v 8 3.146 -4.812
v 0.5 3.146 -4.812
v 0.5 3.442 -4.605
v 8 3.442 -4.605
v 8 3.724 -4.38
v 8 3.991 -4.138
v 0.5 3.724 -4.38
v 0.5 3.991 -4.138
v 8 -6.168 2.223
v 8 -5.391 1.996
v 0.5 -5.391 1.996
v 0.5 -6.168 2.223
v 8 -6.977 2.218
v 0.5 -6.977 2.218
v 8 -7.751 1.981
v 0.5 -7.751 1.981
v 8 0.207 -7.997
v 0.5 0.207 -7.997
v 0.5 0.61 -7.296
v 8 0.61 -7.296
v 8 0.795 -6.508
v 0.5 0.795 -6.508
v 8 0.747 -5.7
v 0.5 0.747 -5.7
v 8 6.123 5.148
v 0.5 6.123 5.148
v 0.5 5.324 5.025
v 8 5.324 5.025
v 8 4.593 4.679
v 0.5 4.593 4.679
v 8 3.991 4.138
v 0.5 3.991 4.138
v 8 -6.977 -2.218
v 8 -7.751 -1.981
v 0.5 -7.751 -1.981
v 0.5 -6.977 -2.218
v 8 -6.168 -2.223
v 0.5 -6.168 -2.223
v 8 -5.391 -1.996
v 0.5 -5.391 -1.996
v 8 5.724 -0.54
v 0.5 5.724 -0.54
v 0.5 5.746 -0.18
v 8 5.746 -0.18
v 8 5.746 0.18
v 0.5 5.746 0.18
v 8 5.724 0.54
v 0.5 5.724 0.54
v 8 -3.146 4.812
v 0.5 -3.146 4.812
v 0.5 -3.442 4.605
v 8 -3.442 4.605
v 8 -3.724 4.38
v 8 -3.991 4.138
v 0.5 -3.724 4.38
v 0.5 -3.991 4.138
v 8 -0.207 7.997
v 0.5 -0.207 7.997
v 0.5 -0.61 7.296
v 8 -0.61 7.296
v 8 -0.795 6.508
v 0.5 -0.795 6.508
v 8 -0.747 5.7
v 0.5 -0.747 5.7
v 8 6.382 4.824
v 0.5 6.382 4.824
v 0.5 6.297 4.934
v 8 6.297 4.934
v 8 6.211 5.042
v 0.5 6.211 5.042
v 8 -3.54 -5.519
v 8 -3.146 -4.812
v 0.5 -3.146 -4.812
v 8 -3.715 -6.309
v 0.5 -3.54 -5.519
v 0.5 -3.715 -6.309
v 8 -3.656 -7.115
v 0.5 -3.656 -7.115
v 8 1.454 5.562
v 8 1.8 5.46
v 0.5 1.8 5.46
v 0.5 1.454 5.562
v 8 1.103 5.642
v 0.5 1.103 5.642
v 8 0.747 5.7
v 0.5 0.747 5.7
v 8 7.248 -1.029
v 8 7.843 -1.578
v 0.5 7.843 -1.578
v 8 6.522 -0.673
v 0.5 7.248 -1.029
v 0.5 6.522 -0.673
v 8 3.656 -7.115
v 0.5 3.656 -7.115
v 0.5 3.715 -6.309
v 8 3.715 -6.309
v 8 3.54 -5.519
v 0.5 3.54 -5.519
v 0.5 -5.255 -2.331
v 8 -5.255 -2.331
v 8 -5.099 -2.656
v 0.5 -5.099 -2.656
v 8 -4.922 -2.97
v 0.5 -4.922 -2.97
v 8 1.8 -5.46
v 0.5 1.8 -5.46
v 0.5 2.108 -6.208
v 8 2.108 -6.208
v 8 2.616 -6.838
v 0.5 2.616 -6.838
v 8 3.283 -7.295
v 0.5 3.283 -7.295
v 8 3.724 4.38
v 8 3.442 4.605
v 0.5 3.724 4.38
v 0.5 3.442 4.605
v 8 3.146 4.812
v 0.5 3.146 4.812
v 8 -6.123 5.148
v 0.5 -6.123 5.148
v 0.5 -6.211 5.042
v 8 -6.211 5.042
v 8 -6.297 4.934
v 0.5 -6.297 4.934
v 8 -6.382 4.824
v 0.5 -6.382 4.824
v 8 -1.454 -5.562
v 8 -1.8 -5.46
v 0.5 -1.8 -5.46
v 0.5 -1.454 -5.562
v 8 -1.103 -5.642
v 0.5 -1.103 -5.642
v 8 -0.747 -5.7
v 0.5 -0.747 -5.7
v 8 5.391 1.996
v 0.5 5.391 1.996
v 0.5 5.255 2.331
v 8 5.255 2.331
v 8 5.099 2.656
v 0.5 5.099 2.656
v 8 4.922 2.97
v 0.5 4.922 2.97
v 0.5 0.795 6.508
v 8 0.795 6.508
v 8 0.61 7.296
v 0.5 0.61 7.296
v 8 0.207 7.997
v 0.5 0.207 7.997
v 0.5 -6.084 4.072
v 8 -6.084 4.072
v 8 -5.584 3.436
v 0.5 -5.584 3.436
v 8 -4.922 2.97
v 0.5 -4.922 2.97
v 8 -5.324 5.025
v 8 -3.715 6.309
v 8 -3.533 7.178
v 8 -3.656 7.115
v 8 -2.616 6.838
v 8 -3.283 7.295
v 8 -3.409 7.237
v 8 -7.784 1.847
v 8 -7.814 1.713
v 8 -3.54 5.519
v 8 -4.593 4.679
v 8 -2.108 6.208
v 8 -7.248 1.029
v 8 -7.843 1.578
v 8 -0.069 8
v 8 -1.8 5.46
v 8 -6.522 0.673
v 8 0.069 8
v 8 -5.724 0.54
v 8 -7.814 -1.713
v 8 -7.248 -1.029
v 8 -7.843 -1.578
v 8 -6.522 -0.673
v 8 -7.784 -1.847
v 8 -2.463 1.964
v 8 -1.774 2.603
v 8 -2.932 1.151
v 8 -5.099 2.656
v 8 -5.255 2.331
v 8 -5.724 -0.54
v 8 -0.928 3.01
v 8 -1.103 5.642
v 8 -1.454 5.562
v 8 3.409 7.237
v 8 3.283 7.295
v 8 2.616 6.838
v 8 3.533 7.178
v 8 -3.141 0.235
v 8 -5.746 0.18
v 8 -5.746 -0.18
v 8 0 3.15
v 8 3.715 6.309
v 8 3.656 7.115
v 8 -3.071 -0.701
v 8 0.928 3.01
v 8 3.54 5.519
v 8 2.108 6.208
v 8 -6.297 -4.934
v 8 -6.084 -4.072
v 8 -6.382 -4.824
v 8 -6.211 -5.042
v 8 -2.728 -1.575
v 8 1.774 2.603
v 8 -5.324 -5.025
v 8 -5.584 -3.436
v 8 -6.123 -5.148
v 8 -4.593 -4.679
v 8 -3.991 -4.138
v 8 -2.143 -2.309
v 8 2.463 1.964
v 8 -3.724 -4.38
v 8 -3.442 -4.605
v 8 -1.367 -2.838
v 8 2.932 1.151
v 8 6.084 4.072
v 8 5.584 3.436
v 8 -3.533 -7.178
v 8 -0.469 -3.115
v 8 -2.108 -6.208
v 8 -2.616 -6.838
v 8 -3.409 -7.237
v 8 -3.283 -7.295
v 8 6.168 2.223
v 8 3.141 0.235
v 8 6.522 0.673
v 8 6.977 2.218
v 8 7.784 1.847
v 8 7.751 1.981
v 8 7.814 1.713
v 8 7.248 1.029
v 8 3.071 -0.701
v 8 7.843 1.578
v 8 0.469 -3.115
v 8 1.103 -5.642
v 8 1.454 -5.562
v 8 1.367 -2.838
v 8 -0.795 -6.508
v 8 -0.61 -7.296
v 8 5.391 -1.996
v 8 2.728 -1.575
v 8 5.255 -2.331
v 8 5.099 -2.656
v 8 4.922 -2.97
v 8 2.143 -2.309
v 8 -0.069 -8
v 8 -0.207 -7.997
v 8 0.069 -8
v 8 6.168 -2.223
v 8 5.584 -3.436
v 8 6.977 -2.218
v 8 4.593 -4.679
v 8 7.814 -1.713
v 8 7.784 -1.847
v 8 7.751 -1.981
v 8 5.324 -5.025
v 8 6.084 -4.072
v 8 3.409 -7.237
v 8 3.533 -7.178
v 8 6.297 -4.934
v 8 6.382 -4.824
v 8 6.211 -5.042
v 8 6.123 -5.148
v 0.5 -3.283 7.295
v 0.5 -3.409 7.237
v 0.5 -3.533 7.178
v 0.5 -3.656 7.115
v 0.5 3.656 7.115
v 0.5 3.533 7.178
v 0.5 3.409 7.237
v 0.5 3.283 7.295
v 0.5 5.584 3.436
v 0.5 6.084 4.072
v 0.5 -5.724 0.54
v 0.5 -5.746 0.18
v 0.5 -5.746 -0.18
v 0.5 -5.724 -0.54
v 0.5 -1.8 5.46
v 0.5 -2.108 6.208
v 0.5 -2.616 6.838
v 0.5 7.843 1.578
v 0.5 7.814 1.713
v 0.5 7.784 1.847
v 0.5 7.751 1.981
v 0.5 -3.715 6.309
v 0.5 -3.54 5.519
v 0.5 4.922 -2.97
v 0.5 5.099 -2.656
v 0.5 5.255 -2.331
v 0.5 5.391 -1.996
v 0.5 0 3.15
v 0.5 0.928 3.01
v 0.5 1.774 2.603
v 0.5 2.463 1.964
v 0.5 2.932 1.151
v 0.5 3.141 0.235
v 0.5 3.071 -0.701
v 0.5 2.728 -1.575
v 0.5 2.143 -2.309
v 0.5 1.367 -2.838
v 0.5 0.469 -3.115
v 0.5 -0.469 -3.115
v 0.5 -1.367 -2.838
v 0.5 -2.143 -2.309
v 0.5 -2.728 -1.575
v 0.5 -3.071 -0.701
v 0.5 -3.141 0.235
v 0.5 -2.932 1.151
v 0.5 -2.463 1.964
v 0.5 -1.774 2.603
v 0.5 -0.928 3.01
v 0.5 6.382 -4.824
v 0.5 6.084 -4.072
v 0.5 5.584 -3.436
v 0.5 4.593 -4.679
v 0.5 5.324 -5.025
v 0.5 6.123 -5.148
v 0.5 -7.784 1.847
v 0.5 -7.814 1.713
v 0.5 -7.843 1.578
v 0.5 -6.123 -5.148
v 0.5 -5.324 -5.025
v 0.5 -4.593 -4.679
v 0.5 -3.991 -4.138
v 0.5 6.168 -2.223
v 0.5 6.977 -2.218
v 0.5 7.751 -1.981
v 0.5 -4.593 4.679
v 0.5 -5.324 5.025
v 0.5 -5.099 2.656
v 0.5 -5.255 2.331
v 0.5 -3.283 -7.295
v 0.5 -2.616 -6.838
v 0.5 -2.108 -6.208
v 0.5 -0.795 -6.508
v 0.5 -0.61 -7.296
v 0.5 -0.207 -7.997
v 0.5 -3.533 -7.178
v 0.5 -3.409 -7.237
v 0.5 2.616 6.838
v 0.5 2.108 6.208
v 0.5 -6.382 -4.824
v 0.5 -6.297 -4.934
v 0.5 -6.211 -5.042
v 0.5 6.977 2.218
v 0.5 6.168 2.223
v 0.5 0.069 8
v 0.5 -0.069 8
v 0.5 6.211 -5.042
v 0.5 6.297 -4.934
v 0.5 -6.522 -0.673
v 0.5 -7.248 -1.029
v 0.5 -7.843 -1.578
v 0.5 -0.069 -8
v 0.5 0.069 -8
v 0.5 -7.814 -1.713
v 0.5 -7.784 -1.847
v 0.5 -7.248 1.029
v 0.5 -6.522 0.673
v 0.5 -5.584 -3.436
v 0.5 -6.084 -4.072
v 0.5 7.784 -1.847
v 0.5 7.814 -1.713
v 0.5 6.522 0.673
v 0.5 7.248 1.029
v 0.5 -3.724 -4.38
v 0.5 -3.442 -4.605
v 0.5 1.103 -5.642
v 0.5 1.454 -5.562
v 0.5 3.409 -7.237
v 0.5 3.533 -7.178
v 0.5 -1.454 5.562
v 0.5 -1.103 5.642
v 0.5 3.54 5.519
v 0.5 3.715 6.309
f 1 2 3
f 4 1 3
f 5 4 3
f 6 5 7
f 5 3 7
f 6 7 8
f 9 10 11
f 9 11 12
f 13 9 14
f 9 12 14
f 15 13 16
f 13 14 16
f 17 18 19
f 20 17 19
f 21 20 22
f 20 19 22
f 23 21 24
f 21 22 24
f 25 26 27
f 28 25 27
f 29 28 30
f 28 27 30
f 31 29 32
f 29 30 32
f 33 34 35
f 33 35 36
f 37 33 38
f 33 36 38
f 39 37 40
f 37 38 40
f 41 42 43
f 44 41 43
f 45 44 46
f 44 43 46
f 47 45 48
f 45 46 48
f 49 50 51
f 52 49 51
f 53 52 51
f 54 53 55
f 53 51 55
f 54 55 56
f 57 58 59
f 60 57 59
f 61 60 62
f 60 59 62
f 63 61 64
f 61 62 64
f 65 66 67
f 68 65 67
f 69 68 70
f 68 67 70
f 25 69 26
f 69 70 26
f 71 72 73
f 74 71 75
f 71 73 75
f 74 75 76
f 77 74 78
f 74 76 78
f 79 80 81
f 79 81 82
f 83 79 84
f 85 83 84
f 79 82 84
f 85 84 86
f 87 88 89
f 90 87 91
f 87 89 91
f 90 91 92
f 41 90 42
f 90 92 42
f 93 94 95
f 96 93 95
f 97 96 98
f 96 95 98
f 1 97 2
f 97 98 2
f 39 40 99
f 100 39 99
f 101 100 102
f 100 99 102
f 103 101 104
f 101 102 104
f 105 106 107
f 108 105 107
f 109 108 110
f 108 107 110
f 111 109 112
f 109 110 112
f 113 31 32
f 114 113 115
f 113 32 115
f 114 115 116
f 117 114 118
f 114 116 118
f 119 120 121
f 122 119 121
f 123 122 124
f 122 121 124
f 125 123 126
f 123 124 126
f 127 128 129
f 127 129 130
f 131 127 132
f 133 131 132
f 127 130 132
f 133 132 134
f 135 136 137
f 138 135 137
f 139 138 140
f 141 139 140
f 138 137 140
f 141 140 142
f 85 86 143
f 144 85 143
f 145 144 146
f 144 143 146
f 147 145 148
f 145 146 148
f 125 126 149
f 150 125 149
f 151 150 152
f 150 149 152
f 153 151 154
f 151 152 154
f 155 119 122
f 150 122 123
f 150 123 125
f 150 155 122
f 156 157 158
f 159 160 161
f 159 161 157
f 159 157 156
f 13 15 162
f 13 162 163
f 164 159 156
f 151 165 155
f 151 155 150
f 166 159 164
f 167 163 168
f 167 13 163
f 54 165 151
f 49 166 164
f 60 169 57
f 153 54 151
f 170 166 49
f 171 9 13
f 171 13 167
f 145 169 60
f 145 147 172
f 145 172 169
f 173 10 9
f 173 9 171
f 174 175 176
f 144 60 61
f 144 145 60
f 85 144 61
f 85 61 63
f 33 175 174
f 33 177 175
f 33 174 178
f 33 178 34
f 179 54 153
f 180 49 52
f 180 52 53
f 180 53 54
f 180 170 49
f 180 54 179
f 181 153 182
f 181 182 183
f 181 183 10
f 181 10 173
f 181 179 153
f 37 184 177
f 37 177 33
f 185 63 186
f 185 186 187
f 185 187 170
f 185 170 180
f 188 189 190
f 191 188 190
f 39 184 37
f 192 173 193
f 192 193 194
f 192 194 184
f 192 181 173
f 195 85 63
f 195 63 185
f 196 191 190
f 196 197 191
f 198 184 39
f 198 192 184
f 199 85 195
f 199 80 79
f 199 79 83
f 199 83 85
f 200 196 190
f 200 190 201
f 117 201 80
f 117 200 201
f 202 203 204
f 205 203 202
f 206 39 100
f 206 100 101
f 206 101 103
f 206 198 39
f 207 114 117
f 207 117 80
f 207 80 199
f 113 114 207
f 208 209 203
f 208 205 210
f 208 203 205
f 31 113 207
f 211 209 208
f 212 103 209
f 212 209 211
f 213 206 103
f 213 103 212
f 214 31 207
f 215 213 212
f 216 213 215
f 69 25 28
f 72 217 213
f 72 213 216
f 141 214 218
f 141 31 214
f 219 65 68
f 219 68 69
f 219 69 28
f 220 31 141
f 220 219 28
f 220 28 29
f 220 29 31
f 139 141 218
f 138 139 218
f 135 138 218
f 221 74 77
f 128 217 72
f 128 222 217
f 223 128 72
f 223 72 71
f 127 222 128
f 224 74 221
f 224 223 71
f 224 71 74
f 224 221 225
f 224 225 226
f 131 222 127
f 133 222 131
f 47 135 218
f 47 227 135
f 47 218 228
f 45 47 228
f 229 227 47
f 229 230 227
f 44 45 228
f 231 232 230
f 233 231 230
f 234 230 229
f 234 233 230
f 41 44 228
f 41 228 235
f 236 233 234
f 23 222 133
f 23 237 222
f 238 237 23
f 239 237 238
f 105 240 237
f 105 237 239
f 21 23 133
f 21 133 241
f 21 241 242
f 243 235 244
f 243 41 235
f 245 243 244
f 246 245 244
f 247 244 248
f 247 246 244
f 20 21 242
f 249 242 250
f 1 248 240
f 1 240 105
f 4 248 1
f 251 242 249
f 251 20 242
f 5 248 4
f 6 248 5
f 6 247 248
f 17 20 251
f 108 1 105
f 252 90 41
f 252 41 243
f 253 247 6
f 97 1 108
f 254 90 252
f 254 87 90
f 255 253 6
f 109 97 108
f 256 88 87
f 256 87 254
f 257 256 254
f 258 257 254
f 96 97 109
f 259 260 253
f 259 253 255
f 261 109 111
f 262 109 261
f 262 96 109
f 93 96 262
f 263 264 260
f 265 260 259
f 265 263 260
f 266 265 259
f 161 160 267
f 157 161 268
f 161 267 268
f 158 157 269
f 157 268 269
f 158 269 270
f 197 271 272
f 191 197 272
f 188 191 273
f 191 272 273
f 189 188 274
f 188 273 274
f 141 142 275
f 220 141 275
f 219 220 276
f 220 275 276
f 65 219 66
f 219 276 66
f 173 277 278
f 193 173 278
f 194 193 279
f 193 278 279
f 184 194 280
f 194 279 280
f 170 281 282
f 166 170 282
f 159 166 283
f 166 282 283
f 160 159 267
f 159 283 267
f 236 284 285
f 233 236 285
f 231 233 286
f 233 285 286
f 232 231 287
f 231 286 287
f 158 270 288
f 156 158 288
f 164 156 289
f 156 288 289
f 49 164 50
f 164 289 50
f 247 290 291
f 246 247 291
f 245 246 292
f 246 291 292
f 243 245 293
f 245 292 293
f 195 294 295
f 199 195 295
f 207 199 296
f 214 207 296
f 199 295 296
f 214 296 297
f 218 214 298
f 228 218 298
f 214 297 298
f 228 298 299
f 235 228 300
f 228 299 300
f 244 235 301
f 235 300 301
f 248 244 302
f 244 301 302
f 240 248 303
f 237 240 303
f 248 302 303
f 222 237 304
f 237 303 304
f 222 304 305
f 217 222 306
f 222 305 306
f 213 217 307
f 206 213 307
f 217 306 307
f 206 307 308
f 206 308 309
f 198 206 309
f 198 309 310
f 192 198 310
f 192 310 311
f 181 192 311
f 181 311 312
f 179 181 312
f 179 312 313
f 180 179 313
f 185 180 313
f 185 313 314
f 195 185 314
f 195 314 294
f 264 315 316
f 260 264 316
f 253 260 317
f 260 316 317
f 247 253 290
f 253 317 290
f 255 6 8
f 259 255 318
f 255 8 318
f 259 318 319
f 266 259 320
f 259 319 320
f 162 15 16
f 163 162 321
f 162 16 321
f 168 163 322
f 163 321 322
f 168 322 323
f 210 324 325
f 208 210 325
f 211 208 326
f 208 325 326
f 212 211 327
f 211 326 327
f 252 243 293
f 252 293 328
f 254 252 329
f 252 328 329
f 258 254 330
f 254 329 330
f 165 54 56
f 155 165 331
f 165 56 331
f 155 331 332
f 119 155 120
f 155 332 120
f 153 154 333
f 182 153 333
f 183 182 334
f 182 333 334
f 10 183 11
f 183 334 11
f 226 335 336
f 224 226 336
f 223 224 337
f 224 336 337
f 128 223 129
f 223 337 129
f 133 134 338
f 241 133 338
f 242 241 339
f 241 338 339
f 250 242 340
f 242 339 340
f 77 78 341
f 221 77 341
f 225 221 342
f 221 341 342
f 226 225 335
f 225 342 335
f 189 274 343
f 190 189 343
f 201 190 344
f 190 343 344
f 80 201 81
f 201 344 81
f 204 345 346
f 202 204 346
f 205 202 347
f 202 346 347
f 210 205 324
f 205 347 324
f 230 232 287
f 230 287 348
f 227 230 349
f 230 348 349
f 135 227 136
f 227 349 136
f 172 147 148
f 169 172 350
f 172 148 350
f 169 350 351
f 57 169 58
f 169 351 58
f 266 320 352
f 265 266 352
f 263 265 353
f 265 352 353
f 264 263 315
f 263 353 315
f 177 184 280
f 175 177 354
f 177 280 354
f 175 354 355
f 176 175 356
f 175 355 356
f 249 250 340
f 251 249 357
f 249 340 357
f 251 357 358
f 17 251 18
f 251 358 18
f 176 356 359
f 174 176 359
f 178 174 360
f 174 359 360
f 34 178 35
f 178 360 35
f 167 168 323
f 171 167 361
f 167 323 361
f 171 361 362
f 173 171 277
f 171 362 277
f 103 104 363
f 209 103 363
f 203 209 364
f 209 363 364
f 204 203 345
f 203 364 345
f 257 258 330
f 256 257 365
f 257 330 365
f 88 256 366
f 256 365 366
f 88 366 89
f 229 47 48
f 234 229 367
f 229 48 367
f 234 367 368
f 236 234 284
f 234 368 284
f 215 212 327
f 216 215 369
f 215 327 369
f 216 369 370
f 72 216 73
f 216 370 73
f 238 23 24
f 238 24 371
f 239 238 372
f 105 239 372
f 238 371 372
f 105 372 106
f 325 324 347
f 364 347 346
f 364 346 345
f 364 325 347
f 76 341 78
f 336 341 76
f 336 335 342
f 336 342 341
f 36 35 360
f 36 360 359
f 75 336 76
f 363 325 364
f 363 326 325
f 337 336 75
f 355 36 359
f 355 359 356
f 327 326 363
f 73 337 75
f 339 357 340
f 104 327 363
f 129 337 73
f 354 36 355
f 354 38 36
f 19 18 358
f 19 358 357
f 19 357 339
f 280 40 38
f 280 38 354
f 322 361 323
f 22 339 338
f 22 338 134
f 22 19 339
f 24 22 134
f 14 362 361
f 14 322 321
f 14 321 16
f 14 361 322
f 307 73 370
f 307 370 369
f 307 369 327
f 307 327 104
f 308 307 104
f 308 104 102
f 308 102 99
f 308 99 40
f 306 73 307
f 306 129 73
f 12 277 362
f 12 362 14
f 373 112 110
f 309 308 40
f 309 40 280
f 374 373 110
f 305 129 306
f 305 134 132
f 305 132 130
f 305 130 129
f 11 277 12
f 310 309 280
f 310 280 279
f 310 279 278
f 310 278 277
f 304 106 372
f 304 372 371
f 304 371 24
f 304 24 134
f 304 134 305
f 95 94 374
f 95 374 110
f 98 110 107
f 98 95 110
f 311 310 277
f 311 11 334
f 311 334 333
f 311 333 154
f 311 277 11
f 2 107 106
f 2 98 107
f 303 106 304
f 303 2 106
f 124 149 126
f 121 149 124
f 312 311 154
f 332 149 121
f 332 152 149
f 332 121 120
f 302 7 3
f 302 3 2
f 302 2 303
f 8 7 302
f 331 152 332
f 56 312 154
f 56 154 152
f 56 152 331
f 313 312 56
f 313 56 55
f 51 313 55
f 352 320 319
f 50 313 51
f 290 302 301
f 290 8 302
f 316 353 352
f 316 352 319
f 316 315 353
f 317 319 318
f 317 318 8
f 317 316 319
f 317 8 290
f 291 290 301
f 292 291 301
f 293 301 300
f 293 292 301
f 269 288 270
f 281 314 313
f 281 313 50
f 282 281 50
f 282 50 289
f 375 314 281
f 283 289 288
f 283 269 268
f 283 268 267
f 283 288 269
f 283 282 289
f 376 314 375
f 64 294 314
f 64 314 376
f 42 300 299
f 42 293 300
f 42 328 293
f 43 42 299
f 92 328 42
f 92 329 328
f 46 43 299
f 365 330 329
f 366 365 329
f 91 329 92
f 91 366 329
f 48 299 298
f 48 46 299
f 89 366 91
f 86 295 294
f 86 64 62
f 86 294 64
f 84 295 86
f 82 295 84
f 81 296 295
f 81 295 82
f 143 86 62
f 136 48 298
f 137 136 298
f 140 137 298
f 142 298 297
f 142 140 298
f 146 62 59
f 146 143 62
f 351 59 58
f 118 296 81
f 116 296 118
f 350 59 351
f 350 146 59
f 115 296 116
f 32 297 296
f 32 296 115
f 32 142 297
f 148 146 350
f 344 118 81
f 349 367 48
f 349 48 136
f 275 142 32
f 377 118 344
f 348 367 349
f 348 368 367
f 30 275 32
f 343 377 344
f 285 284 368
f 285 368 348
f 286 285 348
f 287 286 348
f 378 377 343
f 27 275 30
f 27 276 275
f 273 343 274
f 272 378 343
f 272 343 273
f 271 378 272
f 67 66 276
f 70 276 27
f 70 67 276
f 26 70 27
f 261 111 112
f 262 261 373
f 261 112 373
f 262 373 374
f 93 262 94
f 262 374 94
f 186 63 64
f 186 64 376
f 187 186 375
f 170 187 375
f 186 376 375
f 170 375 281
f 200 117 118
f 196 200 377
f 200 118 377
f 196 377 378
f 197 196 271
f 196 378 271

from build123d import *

# Parameters (mm, degrees)
BOSS_EXTRUDE1_START       = -4.9
BOSS_EXTRUDE1_DEPTH       = 4.9
BOSS_EXTRUDE1_START_2     = -8
BOSS_EXTRUDE1_2_OUTLINE_R = 5
BOSS_EXTRUDE1_2_DEPTH     = 3.1
SKETCH2_R                 = 5.05
CUT_EXTRUDE1_DEPTH        = 3.1
SKETCH3_R                 = 3.25
CUT_EXTRUDE2_DEPTH        = 13.227872143
SKETCH4_R                 = 4
CUT_EXTRUDE3_DEPTH        = 10
SKETCH5_R                 = 4
SKETCH5_R_2               = 3
BOSS_EXTRUDE2_DEPTH       = 4.9
BOSS_EXTRUDE3_DEPTH       = 1
BOSS_EXTRUDE3_DEPTH_BACK  = 1
FILLET1_R                 = 1
SKETCH8_R                 = 3.15
CUT_EXTRUDE4_DEPTH        = 10
BOSS_EXTRUDE4_START       = 3.1
SKETCH9_R                 = 5.05
SKETCH9_R_2               = 3.15
BOSS_EXTRUDE4_DEPTH       = 3.1
SKETCH10_R                = 9.67908905
CUT_EXTRUDE5_DEPTH        = 0.5


with BuildPart() as part:
    # Boss-Extrude1: read off the stored shape, not the designer's step
    # Boss-Extrude1 outline → Boss-Extrude1 (new body)
    with BuildSketch(Plane(origin=(8, 0, 0), x_dir=(0, 0, -1), z_dir=(1, 0, 0)).offset(BOSS_EXTRUDE1_START)):
        with BuildLine():
            ThreePointArc((-7.295176575, -3.283351754), (-7.207750943, -3.471069913), (-7.115495966, -3.656462382))
            ThreePointArc((-7.115495966, -3.656462382), (-5.907248739, -3.655787226), (-4.811777955, -3.146075955))
            ThreePointArc((-4.811777955, -3.146075955), (-4.494749193, -3.584442871), (-4.137918587, -3.991068875))
            ThreePointArc((-4.137918587, -3.991068875), (-4.878615514, -4.945652492), (-5.148134044, -6.123456202))
            ThreePointArc((-5.148134044, -6.123456202), (-4.987918415, -6.25465186), (-4.824360775, -6.381656769))
            ThreePointArc((-4.824360775, -6.381656769), (-3.736060578, -5.856809649), (-2.970230937, -4.922268702))
            ThreePointArc((-2.970230937, -4.922268702), (-2.494397616, -5.179670022), (-1.996475938, -5.391204395))
            ThreePointArc((-1.996475938, -5.391204395), (-2.249642501, -6.572630868), (-1.981440428, -7.750735051))
            ThreePointArc((-1.981440428, -7.750735051), (-1.780167471, -7.799423297), (-1.577701765, -7.842885766))
            ThreePointArc((-1.577701765, -7.842885766), (-0.824899799, -6.897819092), (-0.540393256, -5.723545765))
            ThreePointArc((-0.540393256, -5.723545765), (0, -5.749), (0.540393256, -5.723545765))
            ThreePointArc((0.540393256, -5.723545765), (0.824899799, -6.897819092), (1.577701765, -7.842885766))
            ThreePointArc((1.577701765, -7.842885766), (1.780167471, -7.799423297), (1.981440428, -7.750735051))
            ThreePointArc((1.981440428, -7.750735051), (2.249642501, -6.572630868), (1.996475938, -5.391204395))
            ThreePointArc((1.996475938, -5.391204395), (2.494397616, -5.179670022), (2.970230937, -4.922268702))
            ThreePointArc((2.970230937, -4.922268702), (3.736060578, -5.856809649), (4.824360775, -6.381656769))
            ThreePointArc((4.824360775, -6.381656769), (4.987918415, -6.25465186), (5.148134044, -6.123456202))
            ThreePointArc((5.148134044, -6.123456202), (4.878615514, -4.945652492), (4.137918587, -3.991068875))
            ThreePointArc((4.137918587, -3.991068875), (4.494749193, -3.584442871), (4.811777955, -3.146075955))
            ThreePointArc((4.811777955, -3.146075955), (5.907248739, -3.655787226), (7.115495966, -3.656462382))
            ThreePointArc((7.115495966, -3.656462382), (7.207750943, -3.471069913), (7.295176575, -3.283351754))
            ThreePointArc((7.295176575, -3.283351754), (6.541318892, -2.339126986), (5.459795711, -1.800453218))
            ThreePointArc((5.459795711, -1.800453218), (5.604860567, -1.27927285), (5.700293335, -0.746764281))
            ThreePointArc((5.700293335, -0.746764281), (6.90843384, -0.730691307), (7.997319916, -0.207060777))
            ThreePointArc((7.997319916, -0.207060777), (8, 0), (7.997319916, 0.207060777))
            ThreePointArc((7.997319916, 0.207060777), (6.90843384, 0.730691307), (5.700293335, 0.746764281))
            ThreePointArc((5.700293335, 0.746764281), (5.604860567, 1.27927285), (5.459795711, 1.800453218))
            ThreePointArc((5.459795711, 1.800453218), (6.541318892, 2.339126986), (7.295176575, 3.283351754))
            ThreePointArc((7.295176575, 3.283351754), (7.207750943, 3.471069913), (7.115495966, 3.656462382))
            ThreePointArc((7.115495966, 3.656462382), (5.907248739, 3.655787226), (4.811777955, 3.146075955))
            ThreePointArc((4.811777955, 3.146075955), (4.494749193, 3.584442871), (4.137918587, 3.991068875))
            ThreePointArc((4.137918587, 3.991068875), (4.878615514, 4.945652492), (5.148134044, 6.123456202))
            ThreePointArc((5.148134044, 6.123456202), (4.987918415, 6.25465186), (4.824360775, 6.381656769))
            ThreePointArc((4.824360775, 6.381656769), (3.736060578, 5.856809649), (2.970230937, 4.922268702))
            ThreePointArc((2.970230937, 4.922268702), (2.494397616, 5.179670022), (1.996475938, 5.391204395))
            ThreePointArc((1.996475938, 5.391204395), (2.249642501, 6.572630868), (1.981440428, 7.750735051))
            ThreePointArc((1.981440428, 7.750735051), (1.780167471, 7.799423297), (1.577701765, 7.842885766))
            ThreePointArc((1.577701765, 7.842885766), (0.824899799, 6.897819092), (0.540393256, 5.723545765))
            ThreePointArc((0.540393256, 5.723545765), (0, 5.749), (-0.540393256, 5.723545765))
            ThreePointArc((-0.540393256, 5.723545765), (-0.824899799, 6.897819092), (-1.577701765, 7.842885766))
            ThreePointArc((-1.577701765, 7.842885766), (-1.780167471, 7.799423297), (-1.981440428, 7.750735051))
            ThreePointArc((-1.981440428, 7.750735051), (-2.249642501, 6.572630868), (-1.996475938, 5.391204395))
            ThreePointArc((-1.996475938, 5.391204395), (-2.494397616, 5.179670022), (-2.970230937, 4.922268702))
            ThreePointArc((-2.970230937, 4.922268702), (-3.736060578, 5.856809649), (-4.824360775, 6.381656769))
            ThreePointArc((-4.824360775, 6.381656769), (-4.987918415, 6.25465186), (-5.148134044, 6.123456202))
            ThreePointArc((-5.148134044, 6.123456202), (-4.878615514, 4.945652492), (-4.137918587, 3.991068875))
            ThreePointArc((-4.137918587, 3.991068875), (-4.494749193, 3.584442871), (-4.811777955, 3.146075955))
            ThreePointArc((-4.811777955, 3.146075955), (-5.907248739, 3.655787226), (-7.115495966, 3.656462382))
            ThreePointArc((-7.115495966, 3.656462382), (-7.207750943, 3.471069913), (-7.295176575, 3.283351754))
            ThreePointArc((-7.295176575, 3.283351754), (-6.541318892, 2.339126986), (-5.459795711, 1.800453218))
            ThreePointArc((-5.459795711, 1.800453218), (-5.604860567, 1.27927285), (-5.700293335, 0.746764281))
            ThreePointArc((-5.700293335, 0.746764281), (-6.90843384, 0.730691307), (-7.997319916, 0.207060777))
            ThreePointArc((-7.997319916, 0.207060777), (-8, 0), (-7.997319916, -0.207060777))
            ThreePointArc((-7.997319916, -0.207060777), (-6.90843384, -0.730691307), (-5.700293335, -0.746764281))
            ThreePointArc((-5.700293335, -0.746764281), (-5.604860567, -1.27927285), (-5.459795711, -1.800453218))
            ThreePointArc((-5.459795711, -1.800453218), (-6.541318892, -2.339126986), (-7.295176575, -3.283351754))
        make_face()
    extrude(amount=BOSS_EXTRUDE1_DEPTH)

    # Boss-Extrude1 2 outline → Boss-Extrude1 2 (add)
    with BuildSketch(Plane(origin=(8, 0, 0), x_dir=(0, 0, -1), z_dir=(1, 0, 0)).offset(BOSS_EXTRUDE1_START_2)):
        with BuildLine():
            ThreePointArc((-7.295176575, -3.283351754), (-7.207750943, -3.471069913), (-7.115495966, -3.656462382))
            ThreePointArc((-7.115495966, -3.656462382), (-5.907248739, -3.655787226), (-4.811777955, -3.146075955))
            ThreePointArc((-4.811777955, -3.146075955), (-4.494749193, -3.584442871), (-4.137918587, -3.991068875))
            ThreePointArc((-4.137918587, -3.991068875), (-4.878615514, -4.945652492), (-5.148134044, -6.123456202))
            ThreePointArc((-5.148134044, -6.123456202), (-4.987918415, -6.25465186), (-4.824360775, -6.381656769))
            ThreePointArc((-4.824360775, -6.381656769), (-3.736060578, -5.856809649), (-2.970230937, -4.922268702))
            ThreePointArc((-2.970230937, -4.922268702), (-2.494397616, -5.179670022), (-1.996475938, -5.391204395))
            ThreePointArc((-1.996475938, -5.391204395), (-2.249642501, -6.572630868), (-1.981440428, -7.750735051))
            ThreePointArc((-1.981440428, -7.750735051), (-1.780167471, -7.799423297), (-1.577701765, -7.842885766))
            ThreePointArc((-1.577701765, -7.842885766), (-0.824899799, -6.897819092), (-0.540393256, -5.723545765))
            ThreePointArc((-0.540393256, -5.723545765), (0, -5.749), (0.540393256, -5.723545765))
            ThreePointArc((0.540393256, -5.723545765), (0.824899799, -6.897819092), (1.577701765, -7.842885766))
            ThreePointArc((1.577701765, -7.842885766), (1.780167471, -7.799423297), (1.981440428, -7.750735051))
            ThreePointArc((1.981440428, -7.750735051), (2.249642501, -6.572630868), (1.996475938, -5.391204395))
            ThreePointArc((1.996475938, -5.391204395), (2.494397616, -5.179670022), (2.970230937, -4.922268702))
            ThreePointArc((2.970230937, -4.922268702), (3.736060578, -5.856809649), (4.824360775, -6.381656769))
            ThreePointArc((4.824360775, -6.381656769), (4.987918415, -6.25465186), (5.148134044, -6.123456202))
            ThreePointArc((5.148134044, -6.123456202), (4.878615514, -4.945652492), (4.137918587, -3.991068875))
            ThreePointArc((4.137918587, -3.991068875), (4.494749193, -3.584442871), (4.811777955, -3.146075955))
            ThreePointArc((4.811777955, -3.146075955), (5.907248739, -3.655787226), (7.115495966, -3.656462382))
            ThreePointArc((7.115495966, -3.656462382), (7.207750943, -3.471069913), (7.295176575, -3.283351754))
            ThreePointArc((7.295176575, -3.283351754), (6.541318892, -2.339126986), (5.459795711, -1.800453218))
            ThreePointArc((5.459795711, -1.800453218), (5.604860567, -1.27927285), (5.700293335, -0.746764281))
            ThreePointArc((5.700293335, -0.746764281), (6.90843384, -0.730691307), (7.997319916, -0.207060777))
            ThreePointArc((7.997319916, -0.207060777), (8, 0), (7.997319916, 0.207060777))
            ThreePointArc((7.997319916, 0.207060777), (6.90843384, 0.730691307), (5.700293335, 0.746764281))
            ThreePointArc((5.700293335, 0.746764281), (5.604860567, 1.27927285), (5.459795711, 1.800453218))
            ThreePointArc((5.459795711, 1.800453218), (6.541318892, 2.339126986), (7.295176575, 3.283351754))
            ThreePointArc((7.295176575, 3.283351754), (7.207750943, 3.471069913), (7.115495966, 3.656462382))
            ThreePointArc((7.115495966, 3.656462382), (5.907248739, 3.655787226), (4.811777955, 3.146075955))
            ThreePointArc((4.811777955, 3.146075955), (4.494749193, 3.584442871), (4.137918587, 3.991068875))
            ThreePointArc((4.137918587, 3.991068875), (4.878615514, 4.945652492), (5.148134044, 6.123456202))
            ThreePointArc((5.148134044, 6.123456202), (4.987918415, 6.25465186), (4.824360775, 6.381656769))
            ThreePointArc((4.824360775, 6.381656769), (3.736060578, 5.856809649), (2.970230937, 4.922268702))
            ThreePointArc((2.970230937, 4.922268702), (2.494397616, 5.179670022), (1.996475938, 5.391204395))
            ThreePointArc((1.996475938, 5.391204395), (2.249642501, 6.572630868), (1.981440428, 7.750735051))
            ThreePointArc((1.981440428, 7.750735051), (1.780167471, 7.799423297), (1.577701765, 7.842885766))
            ThreePointArc((1.577701765, 7.842885766), (0.824899799, 6.897819092), (0.540393256, 5.723545765))
            ThreePointArc((0.540393256, 5.723545765), (0, 5.749), (-0.540393256, 5.723545765))
            ThreePointArc((-0.540393256, 5.723545765), (-0.824899799, 6.897819092), (-1.577701765, 7.842885766))
            ThreePointArc((-1.577701765, 7.842885766), (-1.780167471, 7.799423297), (-1.981440428, 7.750735051))
            ThreePointArc((-1.981440428, 7.750735051), (-2.249642501, 6.572630868), (-1.996475938, 5.391204395))
            ThreePointArc((-1.996475938, 5.391204395), (-2.494397616, 5.179670022), (-2.970230937, 4.922268702))
            ThreePointArc((-2.970230937, 4.922268702), (-3.736060578, 5.856809649), (-4.824360775, 6.381656769))
            ThreePointArc((-4.824360775, 6.381656769), (-4.987918415, 6.25465186), (-5.148134044, 6.123456202))
            ThreePointArc((-5.148134044, 6.123456202), (-4.878615514, 4.945652492), (-4.137918587, 3.991068875))
            ThreePointArc((-4.137918587, 3.991068875), (-4.494749193, 3.584442871), (-4.811777955, 3.146075955))
            ThreePointArc((-4.811777955, 3.146075955), (-5.907248739, 3.655787226), (-7.115495966, 3.656462382))
            ThreePointArc((-7.115495966, 3.656462382), (-7.207750943, 3.471069913), (-7.295176575, 3.283351754))
            ThreePointArc((-7.295176575, 3.283351754), (-6.541318892, 2.339126986), (-5.459795711, 1.800453218))
            ThreePointArc((-5.459795711, 1.800453218), (-5.604860567, 1.27927285), (-5.700293335, 0.746764281))
            ThreePointArc((-5.700293335, 0.746764281), (-6.90843384, 0.730691307), (-7.997319916, 0.207060777))
            ThreePointArc((-7.997319916, 0.207060777), (-8, 0), (-7.997319916, -0.207060777))
            ThreePointArc((-7.997319916, -0.207060777), (-6.90843384, -0.730691307), (-5.700293335, -0.746764281))
            ThreePointArc((-5.700293335, -0.746764281), (-5.604860567, -1.27927285), (-5.459795711, -1.800453218))
            ThreePointArc((-5.459795711, -1.800453218), (-6.541318892, -2.339126986), (-7.295176575, -3.283351754))
        make_face()
        Circle(BOSS_EXTRUDE1_2_OUTLINE_R, mode=Mode.SUBTRACT)
    extrude(amount=BOSS_EXTRUDE1_2_DEPTH)

    # Sketch2 → Cut-Extrude1 (cut)
    with BuildSketch(Plane.ZY):
        Circle(SKETCH2_R)
    extrude(amount=-CUT_EXTRUDE1_DEPTH, mode=Mode.SUBTRACT)

    # Sketch3 → Cut-Extrude2 (cut, through all)
    with BuildSketch(Plane.ZY.offset(-3.1)):
        Circle(SKETCH3_R)
    extrude(amount=-CUT_EXTRUDE2_DEPTH, mode=Mode.SUBTRACT)

    # Sketch4 → Cut-Extrude3 (cut)
    with BuildSketch(Plane(origin=(8, 0, 0), x_dir=(0, 0, -1), z_dir=(1, 0, 0))):
        Circle(SKETCH4_R)
    extrude(amount=-CUT_EXTRUDE3_DEPTH, mode=Mode.SUBTRACT)

    # Sketch5 → Boss-Extrude2 (add)
    with BuildSketch(Plane(origin=(8, 0, 0), x_dir=(0, 0, -1), z_dir=(1, 0, 0))):
        Circle(SKETCH5_R)
        Circle(SKETCH5_R_2, mode=Mode.SUBTRACT)
    extrude(amount=-BOSS_EXTRUDE2_DEPTH)

    # Sketch7 → Boss-Extrude3 (add, two sides: drawn at the far end of the back side and taken through both)
    with BuildSketch(Plane.ZY.offset(-1.6).offset(-BOSS_EXTRUDE3_DEPTH_BACK)):
        with BuildLine():
            ThreePointArc((5.096691895, -0.934506311), (5.181657101, 0), (5.096691895, 0.934506311))
            ThreePointArc((5.096691895, 0.934506311), (4.95, 0), (5.096691895, -0.934506311))
        make_face()
        with BuildLine():
            ThreePointArc((-5.096691895, -0.934506311), (-4.95, 0), (-5.096691895, 0.934506311))
            ThreePointArc((-5.096691895, 0.934506311), (-5.181657101, 0), (-5.096691895, -0.934506311))
        make_face()
    extrude(amount=BOSS_EXTRUDE3_DEPTH + BOSS_EXTRUDE3_DEPTH_BACK)

    # Fillet1
    # the kernel refuses this fillet: 1 mm, written as the material it takes off along each edge
    with BuildSketch(Plane(origin=(0.6, 0, 8), x_dir=(0, 0.853406197512974, -0.5212464503921795), z_dir=(0, 0.5212464503921795, 0.853406197512974))) as fillet1_piece_1_section:
        with BuildLine():
            CenterArc((3.05 - FILLET1_R, -FILLET1_R), FILLET1_R, 0, 90)
            Line((3.05, -FILLET1_R), (3.05, 0))
            Line((3.05, 0), (3.05 - FILLET1_R, 0))
        make_face()
    fillet1_piece_1 = revolve(axis=Axis((0.6, 0, 8), (-1, 0, 0)), revolution_arc=117.16820376, mode=Mode.PRIVATE)
    fillet1_piece_1 = fillet1_piece_1 & Plane(origin=(0.6, 0, 0), x_dir=(0, 0, 1), z_dir=(-1, 0, 0)) * Cylinder(5.05, 13, mode=Mode.PRIVATE)
    add(fillet1_piece_1, mode=Mode.SUBTRACT)
    with BuildSketch(Plane(origin=(0.6, 0, -8), x_dir=(0, -0.8534061975130341, 0.521246450392081), z_dir=(0, -0.521246450392081, -0.8534061975130341))) as fillet1_piece_2_section:
        with BuildLine():
            CenterArc((3.05 - FILLET1_R, -FILLET1_R), FILLET1_R, 0, 90)
            Line((3.05 - FILLET1_R, 0), (3.05, 0))
            Line((3.05, 0), (3.05, -FILLET1_R))
        make_face()
    fillet1_piece_2 = revolve(axis=Axis((0.6, 0, -8), (-1, 0, 0)), revolution_arc=117.16820376, mode=Mode.PRIVATE)
    fillet1_piece_2 = fillet1_piece_2 & Plane(origin=(0.6, 0, 0), x_dir=(0, 0, 1), z_dir=(-1, 0, 0)) * Cylinder(5.05, 13, mode=Mode.PRIVATE)
    add(fillet1_piece_2, mode=Mode.SUBTRACT)
    with BuildSketch(Plane(origin=(2.6, 0, -8), x_dir=(0, -0.8534061975130341, 0.521246450392081), z_dir=(0, -0.521246450392081, -0.8534061975130341))) as fillet1_piece_3_section:
        with BuildLine():
            CenterArc((3.05 - FILLET1_R, FILLET1_R), FILLET1_R, 270, 90)
            Line((3.05 - FILLET1_R, 0), (3.05, 0))
            Line((3.05, 0), (3.05, FILLET1_R))
        make_face()
    fillet1_piece_3 = revolve(axis=Axis((2.6, 0, -8), (-1, 0, 0)), revolution_arc=117.16820376, mode=Mode.PRIVATE)
    fillet1_piece_3 = fillet1_piece_3 & Plane(origin=(2.6, 0, 0), x_dir=(0, 0, 1), z_dir=(-1, 0, 0)) * Cylinder(5.05, 13, mode=Mode.PRIVATE)
    add(fillet1_piece_3, mode=Mode.SUBTRACT)
    with BuildSketch(Plane(origin=(2.6, 0, 8), x_dir=(0, 0.853406197512974, -0.5212464503921795), z_dir=(0, 0.5212464503921795, 0.853406197512974))) as fillet1_piece_4_section:
        with BuildLine():
            CenterArc((3.05 - FILLET1_R, FILLET1_R), FILLET1_R, 270, 90)
            Line((3.05 - FILLET1_R, 0), (3.05, 0))
            Line((3.05, 0), (3.05, FILLET1_R))
        make_face()
    fillet1_piece_4 = revolve(axis=Axis((2.6, 0, 8), (-1, 0, 0)), revolution_arc=117.16820376, mode=Mode.PRIVATE)
    fillet1_piece_4 = fillet1_piece_4 & Plane(origin=(2.6, 0, 0), x_dir=(0, 0, 1), z_dir=(-1, 0, 0)) * Cylinder(5.05, 13, mode=Mode.PRIVATE)
    add(fillet1_piece_4, mode=Mode.SUBTRACT)

    # Sketch8 → Cut-Extrude4 (cut)
    with BuildSketch(Plane.ZY.offset(-3.1)):
        Circle(SKETCH8_R)
    extrude(amount=-CUT_EXTRUDE4_DEPTH, mode=Mode.SUBTRACT)

    # Sketch9 → Boss-Extrude4 (add)
    with BuildSketch(Plane.ZY.offset(-3.1).offset(BOSS_EXTRUDE4_START)):
        Circle(SKETCH9_R)
        Circle(SKETCH9_R_2, mode=Mode.SUBTRACT)
    extrude(amount=-BOSS_EXTRUDE4_DEPTH)

    # Sketch10 → Cut-Extrude5 (cut)
    with BuildSketch(Plane.ZY):
        Circle(SKETCH10_R)
    extrude(amount=-CUT_EXTRUDE5_DEPTH, mode=Mode.SUBTRACT)


solid = part.part
